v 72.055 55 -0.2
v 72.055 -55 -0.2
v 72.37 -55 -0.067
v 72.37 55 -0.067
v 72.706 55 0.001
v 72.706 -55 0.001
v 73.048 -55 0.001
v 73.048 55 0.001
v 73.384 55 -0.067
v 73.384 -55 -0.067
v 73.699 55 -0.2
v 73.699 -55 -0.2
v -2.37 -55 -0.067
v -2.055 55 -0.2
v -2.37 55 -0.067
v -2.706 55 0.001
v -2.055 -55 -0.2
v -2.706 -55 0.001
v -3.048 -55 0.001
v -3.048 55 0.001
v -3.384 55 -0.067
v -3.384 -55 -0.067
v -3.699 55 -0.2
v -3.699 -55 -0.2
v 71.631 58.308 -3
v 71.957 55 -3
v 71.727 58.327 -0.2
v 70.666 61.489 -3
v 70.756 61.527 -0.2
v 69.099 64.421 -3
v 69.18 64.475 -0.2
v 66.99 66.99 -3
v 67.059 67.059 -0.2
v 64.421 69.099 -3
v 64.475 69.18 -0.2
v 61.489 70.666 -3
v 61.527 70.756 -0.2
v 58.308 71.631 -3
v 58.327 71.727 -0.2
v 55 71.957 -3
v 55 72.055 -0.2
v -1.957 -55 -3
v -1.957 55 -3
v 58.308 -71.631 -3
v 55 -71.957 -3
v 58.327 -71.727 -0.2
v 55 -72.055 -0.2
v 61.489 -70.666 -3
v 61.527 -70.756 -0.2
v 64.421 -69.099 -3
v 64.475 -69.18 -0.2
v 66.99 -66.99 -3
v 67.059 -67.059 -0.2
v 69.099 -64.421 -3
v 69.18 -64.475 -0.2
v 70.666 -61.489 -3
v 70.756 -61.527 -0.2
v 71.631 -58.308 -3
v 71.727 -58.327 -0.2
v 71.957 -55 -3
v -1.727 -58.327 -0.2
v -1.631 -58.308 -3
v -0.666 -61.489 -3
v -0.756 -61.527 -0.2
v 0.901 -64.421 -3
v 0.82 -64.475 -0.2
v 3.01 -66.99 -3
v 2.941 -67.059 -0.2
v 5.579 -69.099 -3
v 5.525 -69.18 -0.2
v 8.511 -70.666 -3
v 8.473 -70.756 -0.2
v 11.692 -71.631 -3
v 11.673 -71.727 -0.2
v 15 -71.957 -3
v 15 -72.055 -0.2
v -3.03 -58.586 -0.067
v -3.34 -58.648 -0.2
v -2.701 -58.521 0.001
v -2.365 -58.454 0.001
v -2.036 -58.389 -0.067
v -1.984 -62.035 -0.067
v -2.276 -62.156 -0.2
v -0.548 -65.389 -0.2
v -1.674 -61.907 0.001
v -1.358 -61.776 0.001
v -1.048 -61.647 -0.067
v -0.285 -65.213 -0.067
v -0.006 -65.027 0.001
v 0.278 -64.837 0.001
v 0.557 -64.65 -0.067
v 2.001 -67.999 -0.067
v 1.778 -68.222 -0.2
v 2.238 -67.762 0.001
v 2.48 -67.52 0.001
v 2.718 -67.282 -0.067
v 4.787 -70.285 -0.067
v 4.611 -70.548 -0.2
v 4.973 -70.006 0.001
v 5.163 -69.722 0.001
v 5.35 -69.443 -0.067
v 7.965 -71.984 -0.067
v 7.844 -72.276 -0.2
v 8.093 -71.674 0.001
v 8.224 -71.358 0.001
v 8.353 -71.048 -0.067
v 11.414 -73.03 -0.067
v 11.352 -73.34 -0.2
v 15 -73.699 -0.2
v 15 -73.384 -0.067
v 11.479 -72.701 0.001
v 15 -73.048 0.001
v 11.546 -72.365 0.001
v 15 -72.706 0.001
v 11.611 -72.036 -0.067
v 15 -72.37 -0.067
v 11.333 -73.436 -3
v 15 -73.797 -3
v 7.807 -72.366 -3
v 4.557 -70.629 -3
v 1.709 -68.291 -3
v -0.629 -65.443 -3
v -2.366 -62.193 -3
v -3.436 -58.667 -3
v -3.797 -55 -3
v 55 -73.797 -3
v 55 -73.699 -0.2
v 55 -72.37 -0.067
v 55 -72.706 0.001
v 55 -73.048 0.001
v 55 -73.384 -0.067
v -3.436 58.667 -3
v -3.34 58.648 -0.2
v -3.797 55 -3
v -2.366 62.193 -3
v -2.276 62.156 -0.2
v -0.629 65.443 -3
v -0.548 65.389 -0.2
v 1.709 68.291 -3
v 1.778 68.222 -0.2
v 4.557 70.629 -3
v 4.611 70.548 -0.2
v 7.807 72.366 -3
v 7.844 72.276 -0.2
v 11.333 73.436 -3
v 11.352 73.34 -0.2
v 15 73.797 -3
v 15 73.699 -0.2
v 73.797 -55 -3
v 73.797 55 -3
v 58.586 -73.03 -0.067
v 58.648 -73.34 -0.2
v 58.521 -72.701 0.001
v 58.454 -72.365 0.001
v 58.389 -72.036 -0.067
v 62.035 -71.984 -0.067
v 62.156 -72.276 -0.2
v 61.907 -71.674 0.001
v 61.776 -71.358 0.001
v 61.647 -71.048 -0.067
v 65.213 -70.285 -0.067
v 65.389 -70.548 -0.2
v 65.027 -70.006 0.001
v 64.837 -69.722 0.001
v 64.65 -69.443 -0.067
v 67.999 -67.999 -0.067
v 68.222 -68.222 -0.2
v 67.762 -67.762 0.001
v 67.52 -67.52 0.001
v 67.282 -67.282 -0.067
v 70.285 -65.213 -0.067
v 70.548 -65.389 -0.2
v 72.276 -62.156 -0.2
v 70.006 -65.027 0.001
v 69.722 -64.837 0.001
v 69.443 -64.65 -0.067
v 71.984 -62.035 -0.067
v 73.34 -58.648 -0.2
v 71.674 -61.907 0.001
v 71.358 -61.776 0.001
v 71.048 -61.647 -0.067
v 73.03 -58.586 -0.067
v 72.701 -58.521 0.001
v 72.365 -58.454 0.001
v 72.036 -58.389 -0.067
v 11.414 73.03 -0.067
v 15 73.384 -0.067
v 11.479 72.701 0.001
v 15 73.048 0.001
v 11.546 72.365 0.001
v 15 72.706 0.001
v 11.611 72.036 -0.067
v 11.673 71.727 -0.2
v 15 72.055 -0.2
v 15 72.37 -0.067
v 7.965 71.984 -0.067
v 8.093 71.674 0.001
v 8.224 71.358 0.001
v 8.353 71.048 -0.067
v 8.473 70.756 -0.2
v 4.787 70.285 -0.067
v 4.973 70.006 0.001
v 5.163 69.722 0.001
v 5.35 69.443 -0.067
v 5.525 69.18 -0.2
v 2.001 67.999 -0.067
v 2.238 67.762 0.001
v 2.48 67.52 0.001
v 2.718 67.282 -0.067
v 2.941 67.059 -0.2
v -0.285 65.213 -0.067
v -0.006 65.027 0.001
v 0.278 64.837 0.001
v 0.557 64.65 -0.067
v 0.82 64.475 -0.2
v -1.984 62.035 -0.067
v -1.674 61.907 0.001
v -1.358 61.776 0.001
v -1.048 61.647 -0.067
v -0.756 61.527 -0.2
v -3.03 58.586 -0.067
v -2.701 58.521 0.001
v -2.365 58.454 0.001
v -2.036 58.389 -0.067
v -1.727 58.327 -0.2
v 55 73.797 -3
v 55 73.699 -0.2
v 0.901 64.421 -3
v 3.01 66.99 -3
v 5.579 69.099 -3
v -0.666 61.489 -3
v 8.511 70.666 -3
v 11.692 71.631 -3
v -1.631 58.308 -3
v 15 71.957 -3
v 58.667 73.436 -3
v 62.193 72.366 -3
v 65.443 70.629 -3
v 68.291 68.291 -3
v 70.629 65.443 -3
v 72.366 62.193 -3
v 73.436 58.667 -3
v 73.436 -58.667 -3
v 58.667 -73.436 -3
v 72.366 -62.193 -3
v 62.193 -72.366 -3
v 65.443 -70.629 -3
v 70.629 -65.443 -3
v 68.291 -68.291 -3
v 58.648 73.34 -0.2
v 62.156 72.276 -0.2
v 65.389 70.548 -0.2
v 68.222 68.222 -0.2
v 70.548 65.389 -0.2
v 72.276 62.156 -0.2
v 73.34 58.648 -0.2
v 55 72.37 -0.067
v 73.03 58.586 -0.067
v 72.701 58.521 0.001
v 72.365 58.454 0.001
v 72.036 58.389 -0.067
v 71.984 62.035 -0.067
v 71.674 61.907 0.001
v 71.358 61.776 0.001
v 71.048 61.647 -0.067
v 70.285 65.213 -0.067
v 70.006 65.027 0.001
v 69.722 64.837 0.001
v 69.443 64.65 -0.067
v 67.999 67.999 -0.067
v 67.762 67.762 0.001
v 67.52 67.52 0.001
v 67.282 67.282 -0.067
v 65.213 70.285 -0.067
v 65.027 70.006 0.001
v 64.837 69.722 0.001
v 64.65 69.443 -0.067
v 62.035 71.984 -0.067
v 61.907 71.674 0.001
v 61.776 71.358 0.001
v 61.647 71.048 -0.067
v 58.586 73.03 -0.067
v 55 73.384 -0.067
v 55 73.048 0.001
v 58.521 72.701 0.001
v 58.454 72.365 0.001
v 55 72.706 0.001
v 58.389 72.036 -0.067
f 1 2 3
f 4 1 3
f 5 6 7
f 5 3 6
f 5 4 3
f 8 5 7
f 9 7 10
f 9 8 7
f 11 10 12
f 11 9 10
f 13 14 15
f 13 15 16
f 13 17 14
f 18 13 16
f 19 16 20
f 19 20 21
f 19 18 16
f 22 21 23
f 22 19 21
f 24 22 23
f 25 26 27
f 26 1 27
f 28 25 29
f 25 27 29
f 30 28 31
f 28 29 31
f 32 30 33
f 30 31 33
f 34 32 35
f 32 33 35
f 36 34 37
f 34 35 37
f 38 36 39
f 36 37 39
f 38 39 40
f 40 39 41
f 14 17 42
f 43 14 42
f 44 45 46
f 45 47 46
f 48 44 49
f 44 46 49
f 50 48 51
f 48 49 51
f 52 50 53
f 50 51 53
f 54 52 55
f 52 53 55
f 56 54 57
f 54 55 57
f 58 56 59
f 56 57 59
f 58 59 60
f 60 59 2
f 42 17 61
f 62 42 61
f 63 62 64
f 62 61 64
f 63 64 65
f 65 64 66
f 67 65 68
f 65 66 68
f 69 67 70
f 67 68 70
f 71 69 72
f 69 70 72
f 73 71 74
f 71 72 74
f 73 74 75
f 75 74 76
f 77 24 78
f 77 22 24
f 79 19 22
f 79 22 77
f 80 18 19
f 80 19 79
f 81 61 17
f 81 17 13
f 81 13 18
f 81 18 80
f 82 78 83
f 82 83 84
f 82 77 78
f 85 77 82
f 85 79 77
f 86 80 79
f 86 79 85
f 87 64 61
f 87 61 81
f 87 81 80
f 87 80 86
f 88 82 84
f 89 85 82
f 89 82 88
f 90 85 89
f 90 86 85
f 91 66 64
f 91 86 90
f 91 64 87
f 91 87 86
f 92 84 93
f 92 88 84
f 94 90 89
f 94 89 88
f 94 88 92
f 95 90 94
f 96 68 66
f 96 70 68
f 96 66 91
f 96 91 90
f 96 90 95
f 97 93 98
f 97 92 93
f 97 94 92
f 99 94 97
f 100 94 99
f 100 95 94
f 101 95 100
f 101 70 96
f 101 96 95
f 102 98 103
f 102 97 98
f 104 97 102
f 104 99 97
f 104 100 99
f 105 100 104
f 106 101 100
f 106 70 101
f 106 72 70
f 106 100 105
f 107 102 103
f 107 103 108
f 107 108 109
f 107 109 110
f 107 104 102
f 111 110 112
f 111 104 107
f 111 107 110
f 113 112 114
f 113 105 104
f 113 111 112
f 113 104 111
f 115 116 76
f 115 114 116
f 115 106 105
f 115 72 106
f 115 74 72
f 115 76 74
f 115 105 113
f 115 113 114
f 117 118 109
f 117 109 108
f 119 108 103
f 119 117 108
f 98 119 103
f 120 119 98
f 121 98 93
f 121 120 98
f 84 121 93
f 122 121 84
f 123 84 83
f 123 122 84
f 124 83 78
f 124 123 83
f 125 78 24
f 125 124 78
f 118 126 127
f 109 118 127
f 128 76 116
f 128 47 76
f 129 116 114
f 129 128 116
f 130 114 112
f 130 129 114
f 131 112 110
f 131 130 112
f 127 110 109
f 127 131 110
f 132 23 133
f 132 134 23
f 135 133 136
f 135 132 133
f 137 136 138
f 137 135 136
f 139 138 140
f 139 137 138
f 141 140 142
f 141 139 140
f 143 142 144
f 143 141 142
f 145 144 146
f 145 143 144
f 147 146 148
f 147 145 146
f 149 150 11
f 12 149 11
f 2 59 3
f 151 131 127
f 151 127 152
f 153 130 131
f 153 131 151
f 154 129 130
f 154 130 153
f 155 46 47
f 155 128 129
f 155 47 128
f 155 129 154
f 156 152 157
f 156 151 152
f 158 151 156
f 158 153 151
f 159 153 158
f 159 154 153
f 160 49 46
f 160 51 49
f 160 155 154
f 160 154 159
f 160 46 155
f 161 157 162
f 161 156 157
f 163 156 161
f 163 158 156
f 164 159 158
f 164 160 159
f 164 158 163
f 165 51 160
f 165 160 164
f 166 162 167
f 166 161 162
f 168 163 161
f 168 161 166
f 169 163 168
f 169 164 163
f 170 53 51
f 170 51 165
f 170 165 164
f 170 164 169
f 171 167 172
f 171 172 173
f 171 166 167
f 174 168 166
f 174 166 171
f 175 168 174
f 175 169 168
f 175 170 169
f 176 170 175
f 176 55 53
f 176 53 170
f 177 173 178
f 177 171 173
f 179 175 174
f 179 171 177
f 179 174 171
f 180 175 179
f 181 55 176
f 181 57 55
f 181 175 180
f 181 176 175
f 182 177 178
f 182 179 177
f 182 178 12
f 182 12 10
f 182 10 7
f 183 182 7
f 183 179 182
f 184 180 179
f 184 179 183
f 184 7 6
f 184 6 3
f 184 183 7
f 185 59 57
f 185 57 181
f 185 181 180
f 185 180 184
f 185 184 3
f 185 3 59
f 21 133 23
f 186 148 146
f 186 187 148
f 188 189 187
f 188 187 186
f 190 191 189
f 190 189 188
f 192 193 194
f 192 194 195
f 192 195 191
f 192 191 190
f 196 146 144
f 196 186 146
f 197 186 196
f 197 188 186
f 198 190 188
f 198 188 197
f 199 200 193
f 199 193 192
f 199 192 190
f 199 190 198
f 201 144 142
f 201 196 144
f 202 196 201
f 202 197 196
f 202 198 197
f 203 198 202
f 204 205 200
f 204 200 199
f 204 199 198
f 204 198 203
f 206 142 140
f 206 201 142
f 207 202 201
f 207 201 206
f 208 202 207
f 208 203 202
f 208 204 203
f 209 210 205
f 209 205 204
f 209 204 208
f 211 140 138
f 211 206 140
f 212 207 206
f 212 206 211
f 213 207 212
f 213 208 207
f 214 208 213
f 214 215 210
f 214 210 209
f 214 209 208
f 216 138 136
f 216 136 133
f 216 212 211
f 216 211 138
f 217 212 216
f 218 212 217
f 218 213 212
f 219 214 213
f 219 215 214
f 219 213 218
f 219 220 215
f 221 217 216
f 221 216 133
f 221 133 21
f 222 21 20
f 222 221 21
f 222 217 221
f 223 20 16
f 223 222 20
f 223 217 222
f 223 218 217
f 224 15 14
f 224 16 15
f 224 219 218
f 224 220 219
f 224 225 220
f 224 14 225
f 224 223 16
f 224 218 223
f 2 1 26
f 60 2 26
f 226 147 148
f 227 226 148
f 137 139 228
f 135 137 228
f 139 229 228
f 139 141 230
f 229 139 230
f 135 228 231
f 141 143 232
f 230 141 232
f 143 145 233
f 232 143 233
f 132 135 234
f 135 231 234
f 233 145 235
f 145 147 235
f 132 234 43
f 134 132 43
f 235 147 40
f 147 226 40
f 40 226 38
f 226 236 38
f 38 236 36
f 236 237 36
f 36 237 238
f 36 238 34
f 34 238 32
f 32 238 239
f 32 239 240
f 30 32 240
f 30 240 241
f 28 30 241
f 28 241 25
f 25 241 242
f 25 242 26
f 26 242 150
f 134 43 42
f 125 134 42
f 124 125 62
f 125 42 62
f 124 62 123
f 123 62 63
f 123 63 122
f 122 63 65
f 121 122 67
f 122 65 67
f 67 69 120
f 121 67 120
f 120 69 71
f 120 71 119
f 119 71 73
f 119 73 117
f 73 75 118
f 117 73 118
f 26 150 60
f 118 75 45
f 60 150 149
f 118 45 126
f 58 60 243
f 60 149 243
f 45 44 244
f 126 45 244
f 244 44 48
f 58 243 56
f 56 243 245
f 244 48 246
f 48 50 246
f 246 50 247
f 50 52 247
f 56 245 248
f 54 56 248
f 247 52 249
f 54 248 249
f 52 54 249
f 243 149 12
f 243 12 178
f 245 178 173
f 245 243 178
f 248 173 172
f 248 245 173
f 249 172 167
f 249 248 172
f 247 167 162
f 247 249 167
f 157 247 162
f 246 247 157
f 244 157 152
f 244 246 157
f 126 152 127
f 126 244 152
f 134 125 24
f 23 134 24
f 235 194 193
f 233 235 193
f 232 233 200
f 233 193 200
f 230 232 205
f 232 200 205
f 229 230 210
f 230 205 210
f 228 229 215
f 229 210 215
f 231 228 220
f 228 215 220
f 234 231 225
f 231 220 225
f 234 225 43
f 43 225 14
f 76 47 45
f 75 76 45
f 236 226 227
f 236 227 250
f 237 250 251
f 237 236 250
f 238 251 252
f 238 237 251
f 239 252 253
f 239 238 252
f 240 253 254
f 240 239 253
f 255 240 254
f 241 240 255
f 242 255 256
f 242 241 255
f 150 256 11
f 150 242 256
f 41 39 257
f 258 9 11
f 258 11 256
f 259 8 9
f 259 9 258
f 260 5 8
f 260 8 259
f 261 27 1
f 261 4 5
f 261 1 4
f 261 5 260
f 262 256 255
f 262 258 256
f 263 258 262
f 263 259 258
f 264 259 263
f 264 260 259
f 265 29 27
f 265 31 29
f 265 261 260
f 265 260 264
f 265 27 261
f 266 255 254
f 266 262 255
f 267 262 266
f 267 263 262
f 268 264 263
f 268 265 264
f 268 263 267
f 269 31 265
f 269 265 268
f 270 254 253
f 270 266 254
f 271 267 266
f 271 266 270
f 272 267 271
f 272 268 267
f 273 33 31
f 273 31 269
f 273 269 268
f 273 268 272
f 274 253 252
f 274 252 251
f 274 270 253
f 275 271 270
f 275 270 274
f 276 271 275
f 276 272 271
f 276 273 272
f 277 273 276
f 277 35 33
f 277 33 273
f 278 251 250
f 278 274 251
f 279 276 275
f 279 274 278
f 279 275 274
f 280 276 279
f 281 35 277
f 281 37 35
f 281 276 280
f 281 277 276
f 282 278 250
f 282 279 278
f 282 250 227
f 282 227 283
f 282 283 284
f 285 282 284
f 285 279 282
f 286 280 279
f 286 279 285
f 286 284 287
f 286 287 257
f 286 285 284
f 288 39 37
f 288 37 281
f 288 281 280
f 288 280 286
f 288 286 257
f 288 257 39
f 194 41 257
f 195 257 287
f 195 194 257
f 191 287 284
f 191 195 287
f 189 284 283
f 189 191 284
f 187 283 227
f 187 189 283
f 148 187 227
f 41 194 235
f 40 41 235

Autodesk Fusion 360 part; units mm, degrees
sketch "Sketch1" plane through (0, 0, 0) normal (0, 1, 0) x (1, 0, 0)
  line L0 (-4, 12.7291) -> (-4, 24.6266)
  line L1 (0, 24.6266) -> (0, 12.7291)
  line L2 (-1.1892, 37.3052) -> (1, 42)
  line L3 (2.436, 35.6147) -> (2.4713, 35.6905)
  line L4 (35, 38) -> (6.0966, 38)
  line L5 (1, 6.3908) -> (1, 42)
  line L6 (1, 42) -> (35, 42)
  line L7 (35, 42) -> (35, 38)
  arc A0 (-1.1892, 37.3052) -> (-4, 24.6266) centre (26, 24.6266) ccw
  arc A1 (2.436, 35.6147) -> (0, 24.6266) centre (26, 24.6266) ccw
  arc A2 (6.0966, 38) -> (2.4713, 35.6905) centre (6.0966, 34) ccw
  line L8 (0, 12.7291) -> (0, 0)
  line L9 (0, 0) -> (-4, 0)
  line L10 (-4, 0) -> (-4, 12.7291)
  line L11 (-2.8767, 0) -> (-2.8767, -1.8)
  line L12 (-2.8767, 0) -> (-2.8767, 1.8)
  line L13 (-2.8767, -1.8) -> (-1.3767, 0)
  line L14 (-2.8767, 1.8) -> (-1.3767, 0)
  line L15 (-2.8767, 1.8) -> (-4.3767, 0)
  line L16 (-2.8767, -1.8) -> (-4.3767, 0)
  line L17 (-2.8767, -1.6438) -> (-4.2999, 0.064)
  line L18 (-2.8767, -1.6438) -> (-1.4535, 0.064)
  line L19 (-4, 0) -> (-6, 0)
  line L20 (-6, 0) -> (-6, 2.7)
  line L21 (-4, 1.5) -> (-4, 0)
  line L22 (-5.5915, 4.0695) -> (-4, 6.5)
  arc A3 (-5.5915, 4.0695) -> (-6, 2.7) centre (-3.5, 2.7) ccw
  line L23 (-1.3827, 0) -> (-4.3827, 0)
  line L24 (-4.3827, 0) -> (-1.3636, 0) construction
  line L25 (-3.8767, 0) -> (-1.8767, 0)
  line L26 (-1.8767, 0) -> (-1.8767, 3)
  line L27 (-1.8767, 3) -> (-3.8767, 3)
  line L28 (-3.8767, 3) -> (-3.8767, 0)
  line L29 (-1.8767, 3) -> (-1.9572, 0.6965)
  line L30 (-1.8767, 3) -> (0.4282, 3) construction
  line L31 (-3.8767, 3) -> (-3.7963, 0.6965)
  dimension "d5" = 4
  dimension "d6" = 30
  dimension "d7" = 26
  dimension "d8" = 4
  dimension "d9" = 1.8
  dimension "d10" = 1.8
  dimension "d11" = 1.5
  dimension "d12" = 1.5
  dimension "d13" = 0.1
  dimension "d30" = 4
  dimension "d33" = 4
  dimension "d36" = 5
  dimension "d38" = 35
  dimension "d60" = 25
  dimension "d113" = 2
  dimension "d115" = 2.5
  dimension "d126" = 6.5
  dimension "d334" = 4
  dimension "d335" = 38
  dimension "d486" = 1
  dimension "d487" = 1
  dimension "d488" = 3
  dimension "d489" = 2.8767
  dimension "d490" = 92
  dimension "d491" = 88
sketch "Sketch2" plane through (0, 0, 0) normal (0, 0, 1) x (1, 0, 0)
  line L0 (15, 70) -> (55, 70)
  line L1 (70, 55) -> (70, -55)
  line L2 (55, -70) -> (15, -70)
  line L3 (0, -55) -> (0, 55)
  arc A0 (15, 70) -> (0, 55) centre (15, 55) ccw
  arc A1 (70, 55) -> (55, 70) centre (55, 55) ccw
  arc A2 (55, -70) -> (70, -55) centre (55, -55) ccw
  arc A3 (0, -55) -> (15, -70) centre (15, -55) ccw
  dimension "d14" = 15
  dimension "d15" = 15
  dimension "d16" = 15
  dimension "d17" = 15
  dimension "d39" = 70
  dimension "d40" = 140
sketch "Sketch24" plane through (0, 0, 0) normal (0, 1, 0) x (1, 0, 0)
  line L0 (-1.8767, 3) -> (-3.8767, 3)
  line L1 (-3.7967, 3) -> (-3.6989, 0.2)
  line L2 (-4.3827, 0) -> (-1.3636, 0)
  line L3 (-3.6989, 0.2) -> (-2.0546, 0.2)
  line L4 (-2.0546, 0.2) -> (-1.9568, 3)
  line L5 (-1.9568, 3) -> (-3.7967, 3)
  line L6 (-3.8767, 3) -> (-3.7963, 0.6965)
  line L7 (-1.8767, 3) -> (-1.9572, 0.6965)
  arc A0 (-3.6989, 0.2) -> (-2.0546, 0.2) centre (-2.8767, 1.7053) ccw
  dimension "d493" = 0.08
  dimension "d494" = 0.08
  dimension "d495" = 2.8
  dimension "d538" = 1.7152
sweep "Sweep4" add profiles "Sketch24" path "Sketch2" along A0 L0 A1 L1 A2 L2 A3 L3 section 1
equation "d5 = Twall"
equation "d6 = Rbase"
equation "d7 = Rbase - Twall"
equation "d14 = Rcorner"
equation "d15 = Rcorner"
equation "d16 = Rcorner"
equation "d17 = Rcorner"
equation "Twall = 4 mm"
equation "length = 140 mm"
equation "width = 70 mm"
equation "height = 38 mm"
equation "Rcorner = 15 mm"
equation "Rbase = 30 mm"
equation "d30 = Twall"
equation "d33 = Twall"
equation "d36 = base_inset"
equation "base_inset = 5 mm"
equation "d38 = width * 0.5"
equation "d39 = width"
equation "d40 = length"
equation "d60 = base_ang"
equation "base_ang = 25 deg"
equation "d334 = Twall"
equation "d335 = height"
equation "d495 = oringHeight"
equation "oringHeight = 2.8 mm"
